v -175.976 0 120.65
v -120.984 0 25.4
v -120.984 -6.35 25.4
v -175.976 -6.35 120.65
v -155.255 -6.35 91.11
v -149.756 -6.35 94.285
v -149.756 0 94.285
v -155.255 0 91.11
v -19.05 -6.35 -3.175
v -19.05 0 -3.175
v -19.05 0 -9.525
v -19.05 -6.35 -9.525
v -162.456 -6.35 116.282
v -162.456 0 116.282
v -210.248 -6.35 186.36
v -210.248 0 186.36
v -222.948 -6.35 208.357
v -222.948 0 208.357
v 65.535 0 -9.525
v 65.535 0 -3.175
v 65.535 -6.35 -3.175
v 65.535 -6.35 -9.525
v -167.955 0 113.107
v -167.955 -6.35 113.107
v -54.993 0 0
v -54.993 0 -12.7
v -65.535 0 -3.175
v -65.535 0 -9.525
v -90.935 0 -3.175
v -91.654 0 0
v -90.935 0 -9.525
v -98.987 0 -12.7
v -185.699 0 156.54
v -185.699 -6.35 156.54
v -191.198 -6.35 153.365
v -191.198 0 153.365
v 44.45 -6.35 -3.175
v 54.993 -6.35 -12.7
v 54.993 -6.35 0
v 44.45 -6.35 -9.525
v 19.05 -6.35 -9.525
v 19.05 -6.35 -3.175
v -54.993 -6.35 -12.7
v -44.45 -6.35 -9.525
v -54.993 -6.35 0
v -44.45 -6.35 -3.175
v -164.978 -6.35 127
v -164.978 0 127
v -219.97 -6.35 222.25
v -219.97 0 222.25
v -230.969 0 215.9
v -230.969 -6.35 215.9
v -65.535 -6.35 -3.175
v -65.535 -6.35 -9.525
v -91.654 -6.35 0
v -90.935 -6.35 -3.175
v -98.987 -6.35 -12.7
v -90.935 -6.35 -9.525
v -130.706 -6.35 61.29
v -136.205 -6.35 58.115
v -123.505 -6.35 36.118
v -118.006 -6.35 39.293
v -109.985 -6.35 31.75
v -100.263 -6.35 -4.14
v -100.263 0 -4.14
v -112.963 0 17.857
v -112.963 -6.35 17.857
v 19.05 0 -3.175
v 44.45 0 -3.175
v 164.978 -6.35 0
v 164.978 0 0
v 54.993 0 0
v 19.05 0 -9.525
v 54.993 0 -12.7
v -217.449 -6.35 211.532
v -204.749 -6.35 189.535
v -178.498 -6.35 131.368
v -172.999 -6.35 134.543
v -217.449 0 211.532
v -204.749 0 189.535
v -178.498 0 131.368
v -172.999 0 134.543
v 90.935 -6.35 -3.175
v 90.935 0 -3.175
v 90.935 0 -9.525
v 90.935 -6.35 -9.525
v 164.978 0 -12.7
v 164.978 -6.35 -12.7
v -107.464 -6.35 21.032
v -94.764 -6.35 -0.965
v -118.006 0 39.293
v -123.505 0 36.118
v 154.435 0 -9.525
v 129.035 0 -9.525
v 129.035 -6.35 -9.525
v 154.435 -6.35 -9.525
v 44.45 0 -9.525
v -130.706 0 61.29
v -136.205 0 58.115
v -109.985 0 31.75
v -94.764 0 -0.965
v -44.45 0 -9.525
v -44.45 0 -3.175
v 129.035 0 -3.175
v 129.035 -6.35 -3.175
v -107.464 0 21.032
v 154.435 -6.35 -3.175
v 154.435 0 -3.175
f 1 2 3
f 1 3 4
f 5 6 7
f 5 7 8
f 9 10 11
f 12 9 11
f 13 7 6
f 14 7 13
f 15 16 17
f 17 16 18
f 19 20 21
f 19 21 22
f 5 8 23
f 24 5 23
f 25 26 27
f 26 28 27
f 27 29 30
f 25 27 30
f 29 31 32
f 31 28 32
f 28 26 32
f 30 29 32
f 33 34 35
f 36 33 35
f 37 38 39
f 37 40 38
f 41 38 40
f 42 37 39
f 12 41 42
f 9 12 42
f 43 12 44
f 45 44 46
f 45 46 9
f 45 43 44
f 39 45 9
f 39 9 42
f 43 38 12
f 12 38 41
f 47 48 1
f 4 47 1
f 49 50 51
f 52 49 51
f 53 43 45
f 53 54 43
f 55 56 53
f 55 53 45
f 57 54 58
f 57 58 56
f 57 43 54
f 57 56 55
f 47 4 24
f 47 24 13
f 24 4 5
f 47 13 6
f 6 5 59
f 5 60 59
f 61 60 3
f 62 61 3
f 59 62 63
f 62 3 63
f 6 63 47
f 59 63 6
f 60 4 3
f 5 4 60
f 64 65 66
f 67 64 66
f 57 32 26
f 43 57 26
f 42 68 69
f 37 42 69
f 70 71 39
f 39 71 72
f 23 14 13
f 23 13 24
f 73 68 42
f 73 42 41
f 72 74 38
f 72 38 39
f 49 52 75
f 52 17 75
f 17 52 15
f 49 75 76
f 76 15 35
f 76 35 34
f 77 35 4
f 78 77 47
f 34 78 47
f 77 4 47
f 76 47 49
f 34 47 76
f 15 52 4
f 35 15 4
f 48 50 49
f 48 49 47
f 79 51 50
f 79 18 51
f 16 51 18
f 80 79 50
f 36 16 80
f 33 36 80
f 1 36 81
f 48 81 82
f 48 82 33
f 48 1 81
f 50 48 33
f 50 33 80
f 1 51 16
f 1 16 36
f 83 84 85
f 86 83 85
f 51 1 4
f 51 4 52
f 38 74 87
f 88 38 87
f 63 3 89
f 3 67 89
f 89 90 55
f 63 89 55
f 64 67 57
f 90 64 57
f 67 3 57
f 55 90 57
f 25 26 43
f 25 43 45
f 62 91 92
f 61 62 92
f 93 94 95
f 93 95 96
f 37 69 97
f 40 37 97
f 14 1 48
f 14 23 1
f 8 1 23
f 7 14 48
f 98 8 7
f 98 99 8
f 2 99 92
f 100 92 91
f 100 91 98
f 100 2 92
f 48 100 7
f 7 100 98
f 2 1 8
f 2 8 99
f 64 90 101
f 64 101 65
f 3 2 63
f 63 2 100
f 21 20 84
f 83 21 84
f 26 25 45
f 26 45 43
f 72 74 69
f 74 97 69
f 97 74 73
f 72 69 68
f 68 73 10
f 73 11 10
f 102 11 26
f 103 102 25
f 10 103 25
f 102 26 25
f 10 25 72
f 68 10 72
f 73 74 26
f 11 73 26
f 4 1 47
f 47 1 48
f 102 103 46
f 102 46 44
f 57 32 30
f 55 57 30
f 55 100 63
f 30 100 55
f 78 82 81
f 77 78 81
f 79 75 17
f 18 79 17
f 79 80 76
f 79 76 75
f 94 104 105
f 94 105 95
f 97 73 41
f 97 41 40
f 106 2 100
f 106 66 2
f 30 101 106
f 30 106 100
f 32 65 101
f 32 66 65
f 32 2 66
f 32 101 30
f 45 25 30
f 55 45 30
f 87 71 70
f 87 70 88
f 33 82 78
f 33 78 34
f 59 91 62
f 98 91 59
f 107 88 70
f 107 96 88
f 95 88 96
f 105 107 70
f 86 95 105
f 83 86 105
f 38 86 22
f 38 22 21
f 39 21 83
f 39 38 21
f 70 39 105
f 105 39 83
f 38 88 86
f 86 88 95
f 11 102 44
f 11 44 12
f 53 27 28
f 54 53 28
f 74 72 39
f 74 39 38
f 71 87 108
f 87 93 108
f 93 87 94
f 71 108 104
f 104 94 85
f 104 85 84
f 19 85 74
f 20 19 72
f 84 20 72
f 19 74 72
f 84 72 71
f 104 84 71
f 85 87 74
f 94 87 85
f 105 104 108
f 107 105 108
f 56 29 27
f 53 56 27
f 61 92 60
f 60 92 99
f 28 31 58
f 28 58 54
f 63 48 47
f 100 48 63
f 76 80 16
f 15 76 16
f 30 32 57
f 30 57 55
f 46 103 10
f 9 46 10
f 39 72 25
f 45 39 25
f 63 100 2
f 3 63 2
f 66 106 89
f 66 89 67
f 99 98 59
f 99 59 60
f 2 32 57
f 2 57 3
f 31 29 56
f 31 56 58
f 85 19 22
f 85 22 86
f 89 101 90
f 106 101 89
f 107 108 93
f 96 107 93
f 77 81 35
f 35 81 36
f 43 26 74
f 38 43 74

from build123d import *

# Parameters (mm, degrees)
BOSS_EXTRUDE1_DEPTH = 6.35
CUT_EXTRUDE4_DEPTH  = 111.168382488
BOSS_EXTRUDE4_DEPTH = 6.35
CIRPATTERN1_COUNT   = 2
CIRPATTERN1_ANGLE   = 60
SKETCH12_W          = 109.98522628
SKETCH12_H          = 82.55
CUT_EXTRUDE5_DEPTH  = 111.168382488
SKETCH13_W          = 25.4
SKETCH13_H          = 6.35
CUT_EXTRUDE6_DEPTH  = 64.816710194
LPATTERN1_COUNT     = 5
LPATTERN1_PITCH     = 109.985226308
LPATTERN1_2_COUNT   = 2
LPATTERN1_2_PITCH   = 109.985226308
SKETCH14_W          = 25.4
SKETCH14_H          = 6.35
CUT_EXTRUDE7_DEPTH  = 496.991504573
CUT_EXTRUDE8_DEPTH  = 431.162704792


with BuildPart() as part:
    # Sketch1 → Boss-Extrude1 (new body)
    with BuildSketch(Plane(origin=(0, 0, 0), x_dir=(1, 0, 0), z_dir=(0, 1, 0))):
        Polygon((-54.99261314, 0), (0, -31.75), (54.99261314, 0), (54.99261314, 63.5), (0, 95.25), (-54.99261314, 63.5), align=None)
    extrude(amount=-BOSS_EXTRUDE1_DEPTH)

    # Sketch10 → Cut-Extrude4 (cut, through all)
    with BuildSketch(Plane(origin=(0, 0, 0), x_dir=(1, 0, 0), z_dir=(0, 1, 0))):
        Polygon((-16.497783942, -22.225), (-7.823522628, -19.900738686), (-24.32130657, -10.375738686), (-27.49630657, -15.875), align=None)
    cut_extrude4 = extrude(amount=-CUT_EXTRUDE4_DEPTH, mode=Mode.SUBTRACT)

    # Sketch11 → Boss-Extrude4 (add)
    with BuildSketch(Plane(origin=(0, 0, 0), x_dir=(1, 0, 0), z_dir=(0, 1, 0))):
        Polygon((-27.49630657, -15.875), (-30.67130657, -21.374261314), (-47.169090512, -11.849261314), (-38.494829198, -9.525), align=None)
    boss_extrude4 = extrude(amount=-BOSS_EXTRUDE4_DEPTH)

    # CirPattern1: Cut-Extrude4, Boss-Extrude4 ×2 about axis
    cirpattern1_axis = Axis((0, 0, -31.75), (0, 1, 0))
    add([cut_extrude4.rotate(cirpattern1_axis, i * CIRPATTERN1_ANGLE / (CIRPATTERN1_COUNT - 1)) for i in range(1, CIRPATTERN1_COUNT)], mode=Mode.SUBTRACT)
    add([boss_extrude4.rotate(cirpattern1_axis, i * CIRPATTERN1_ANGLE / (CIRPATTERN1_COUNT - 1)) for i in range(1, CIRPATTERN1_COUNT)])

    # Sketch12 → Cut-Extrude5 (cut, through all)
    with BuildSketch(Plane(origin=(0, 0, 0), x_dir=(1, 0, 0), z_dir=(0, 1, 0))):
        with Locations((0, 53.975)):
            Rectangle(SKETCH12_W, SKETCH12_H)
    extrude(amount=-CUT_EXTRUDE5_DEPTH, mode=Mode.SUBTRACT)

    # Sketch13 → Cut-Extrude6 (cut, through all)
    with BuildSketch(Plane(origin=(0, 0, 0), x_dir=(1, 0, 0), z_dir=(0, 1, 0))):
        with Locations((-31.75, 6.35)):
            Rectangle(SKETCH13_W, SKETCH13_H)
        with Locations((31.75, 6.35)):
            Rectangle(SKETCH13_W, SKETCH13_H)
    extrude(amount=-CUT_EXTRUDE6_DEPTH, mode=Mode.SUBTRACT)


with BuildPart() as lpattern1_1:
    # LPattern1: pattern copy
    add(part.part.moved(Location(Vector(1, 0, 0) * (1 * LPATTERN1_PITCH))))


with BuildPart() as lpattern1_2:
    # LPattern1: pattern copy
    add(part.part.moved(Location(Vector(1, 0, 0) * (2 * LPATTERN1_PITCH))))


with BuildPart() as lpattern1_3:
    # LPattern1: pattern copy
    add(part.part.moved(Location(Vector(1, 0, 0) * (3 * LPATTERN1_PITCH))))


with BuildPart() as lpattern1_4:
    # LPattern1: pattern copy
    add(part.part.moved(Location(Vector(1, 0, 0) * (4 * LPATTERN1_PITCH))))


with BuildPart() as lpattern1_2_1:
    # LPattern1 2: pattern copy
    add(part.part.moved(Location(Vector(-1, 0, 0) * (1 * LPATTERN1_2_PITCH))))


with BuildPart() as cut_extrude7_tool:
    # Sketch14 → Cut-Extrude7 (new, through all)
    # profile 1 of 2: a face of its own
    with BuildSketch(Plane(origin=(0, 0, 0), x_dir=(1, 0, 0), z_dir=(0, 1, 0))):
        Polygon((423.44312129, -22.225), (439.940905232, -31.75), (456.438689174, -22.225), (454.11442786, -30.899261314), (470.612211802, -21.374261314), (464.262211802, -10.375738686), (480.759995744, -0.850738686), (478.43573443, -9.525), (494.933518372, 0), (494.933518372, 12.7), (428.942382604, 12.7), (415.619598662, -10.375738686), (432.117382604, -19.900738686), align=None)
        with Locations((471.690905232, 6.35)):
            Rectangle(SKETCH14_W, SKETCH14_H, mode=Mode.SUBTRACT)
    # profile 2 of 2: a face of its own
    with BuildSketch(Plane(origin=(0, 0, 0), x_dir=(1, 0, 0), z_dir=(0, 1, 0))):
        Polygon((-164.977839448, -31.75), (-109.985226308, -31.75), (-95.81170368, -30.899261314), (-79.313919738, -21.374261314), (-98.98670368, 12.7), (-164.977839448, 12.7), align=None)
    extrude(amount=-CUT_EXTRUDE7_DEPTH)


with BuildPart() as lpattern1_4_1:
    add(lpattern1_4.part)

    # Cut-Extrude7: cut by cut_extrude7_tool
    add(cut_extrude7_tool.part, mode=Mode.SUBTRACT)


with BuildPart() as lpattern1_2_1_1:
    add(lpattern1_2_1.part)

    # Cut-Extrude7: cut by cut_extrude7_tool
    add(cut_extrude7_tool.part, mode=Mode.SUBTRACT)


with BuildPart() as cut_extrude8_tool:
    # Sketch15 → Cut-Extrude8 (new, through all)
    with BuildSketch(Plane(origin=(0, 0, 0), x_dir=(1, 0, 0), z_dir=(0, 1, 0))):
        Polygon((-222.372160524, 0), (-222.372160524, -63.5), (552.327839476, -63.5), (552.327839476, 12.7), (164.977839476, 12.7), (164.977839476, 0), align=None)
    extrude(amount=-CUT_EXTRUDE8_DEPTH)


with BuildPart() as part_1:
    add(part.part)

    # Cut-Extrude8: cut by cut_extrude8_tool
    add(cut_extrude8_tool.part, mode=Mode.SUBTRACT)


with BuildPart() as lpattern1_1_1:
    add(lpattern1_1.part)

    # Cut-Extrude8: cut by cut_extrude8_tool
    add(cut_extrude8_tool.part, mode=Mode.SUBTRACT)


with BuildPart() as lpattern1_2_2:
    add(lpattern1_2.part)

    # Cut-Extrude8: cut by cut_extrude8_tool
    add(cut_extrude8_tool.part, mode=Mode.SUBTRACT)


with BuildPart() as lpattern1_3_1:
    add(lpattern1_3.part)

    # Cut-Extrude8: cut by cut_extrude8_tool
    add(cut_extrude8_tool.part, mode=Mode.SUBTRACT)


with BuildPart() as lpattern1_4_2:
    add(lpattern1_4_1.part)

    # Cut-Extrude8: cut by cut_extrude8_tool
    add(cut_extrude8_tool.part, mode=Mode.SUBTRACT)


with BuildPart() as lpattern1_2_1_2:
    add(lpattern1_2_1_1.part)

    # Cut-Extrude8: cut by cut_extrude8_tool
    add(cut_extrude8_tool.part, mode=Mode.SUBTRACT)


with BuildPart() as body_4:
    # Mirror1: mirrored copy
    add(lpattern1_2_1_2.part.mirror(Plane(origin=(-68.740766446, -6.35, 39.687500012), x_dir=(0.500000000000001, 0, 0.8660254037844382), z_dir=(0.8660254037844383, 0, -0.5000000000000009))))


with BuildPart() as body_5:
    # Mirror1 2: mirrored copy
    add(part_1.part.mirror(Plane(origin=(-68.740766446, -6.35, 39.687500012), x_dir=(0.500000000000001, 0, 0.8660254037844382), z_dir=(0.8660254037844383, 0, -0.5000000000000009))))


with BuildPart() as body_6:
    # Mirror1 3: mirrored copy
    add(lpattern1_1_1.part.mirror(Plane(origin=(-68.740766446, -6.35, 39.687500012), x_dir=(0.500000000000001, 0, 0.8660254037844382), z_dir=(0.8660254037844383, 0, -0.5000000000000009))))


solid = Compound([part_1.part, lpattern1_1_1.part, lpattern1_2_1_2.part, body_4.part, body_5.part, body_6.part])
